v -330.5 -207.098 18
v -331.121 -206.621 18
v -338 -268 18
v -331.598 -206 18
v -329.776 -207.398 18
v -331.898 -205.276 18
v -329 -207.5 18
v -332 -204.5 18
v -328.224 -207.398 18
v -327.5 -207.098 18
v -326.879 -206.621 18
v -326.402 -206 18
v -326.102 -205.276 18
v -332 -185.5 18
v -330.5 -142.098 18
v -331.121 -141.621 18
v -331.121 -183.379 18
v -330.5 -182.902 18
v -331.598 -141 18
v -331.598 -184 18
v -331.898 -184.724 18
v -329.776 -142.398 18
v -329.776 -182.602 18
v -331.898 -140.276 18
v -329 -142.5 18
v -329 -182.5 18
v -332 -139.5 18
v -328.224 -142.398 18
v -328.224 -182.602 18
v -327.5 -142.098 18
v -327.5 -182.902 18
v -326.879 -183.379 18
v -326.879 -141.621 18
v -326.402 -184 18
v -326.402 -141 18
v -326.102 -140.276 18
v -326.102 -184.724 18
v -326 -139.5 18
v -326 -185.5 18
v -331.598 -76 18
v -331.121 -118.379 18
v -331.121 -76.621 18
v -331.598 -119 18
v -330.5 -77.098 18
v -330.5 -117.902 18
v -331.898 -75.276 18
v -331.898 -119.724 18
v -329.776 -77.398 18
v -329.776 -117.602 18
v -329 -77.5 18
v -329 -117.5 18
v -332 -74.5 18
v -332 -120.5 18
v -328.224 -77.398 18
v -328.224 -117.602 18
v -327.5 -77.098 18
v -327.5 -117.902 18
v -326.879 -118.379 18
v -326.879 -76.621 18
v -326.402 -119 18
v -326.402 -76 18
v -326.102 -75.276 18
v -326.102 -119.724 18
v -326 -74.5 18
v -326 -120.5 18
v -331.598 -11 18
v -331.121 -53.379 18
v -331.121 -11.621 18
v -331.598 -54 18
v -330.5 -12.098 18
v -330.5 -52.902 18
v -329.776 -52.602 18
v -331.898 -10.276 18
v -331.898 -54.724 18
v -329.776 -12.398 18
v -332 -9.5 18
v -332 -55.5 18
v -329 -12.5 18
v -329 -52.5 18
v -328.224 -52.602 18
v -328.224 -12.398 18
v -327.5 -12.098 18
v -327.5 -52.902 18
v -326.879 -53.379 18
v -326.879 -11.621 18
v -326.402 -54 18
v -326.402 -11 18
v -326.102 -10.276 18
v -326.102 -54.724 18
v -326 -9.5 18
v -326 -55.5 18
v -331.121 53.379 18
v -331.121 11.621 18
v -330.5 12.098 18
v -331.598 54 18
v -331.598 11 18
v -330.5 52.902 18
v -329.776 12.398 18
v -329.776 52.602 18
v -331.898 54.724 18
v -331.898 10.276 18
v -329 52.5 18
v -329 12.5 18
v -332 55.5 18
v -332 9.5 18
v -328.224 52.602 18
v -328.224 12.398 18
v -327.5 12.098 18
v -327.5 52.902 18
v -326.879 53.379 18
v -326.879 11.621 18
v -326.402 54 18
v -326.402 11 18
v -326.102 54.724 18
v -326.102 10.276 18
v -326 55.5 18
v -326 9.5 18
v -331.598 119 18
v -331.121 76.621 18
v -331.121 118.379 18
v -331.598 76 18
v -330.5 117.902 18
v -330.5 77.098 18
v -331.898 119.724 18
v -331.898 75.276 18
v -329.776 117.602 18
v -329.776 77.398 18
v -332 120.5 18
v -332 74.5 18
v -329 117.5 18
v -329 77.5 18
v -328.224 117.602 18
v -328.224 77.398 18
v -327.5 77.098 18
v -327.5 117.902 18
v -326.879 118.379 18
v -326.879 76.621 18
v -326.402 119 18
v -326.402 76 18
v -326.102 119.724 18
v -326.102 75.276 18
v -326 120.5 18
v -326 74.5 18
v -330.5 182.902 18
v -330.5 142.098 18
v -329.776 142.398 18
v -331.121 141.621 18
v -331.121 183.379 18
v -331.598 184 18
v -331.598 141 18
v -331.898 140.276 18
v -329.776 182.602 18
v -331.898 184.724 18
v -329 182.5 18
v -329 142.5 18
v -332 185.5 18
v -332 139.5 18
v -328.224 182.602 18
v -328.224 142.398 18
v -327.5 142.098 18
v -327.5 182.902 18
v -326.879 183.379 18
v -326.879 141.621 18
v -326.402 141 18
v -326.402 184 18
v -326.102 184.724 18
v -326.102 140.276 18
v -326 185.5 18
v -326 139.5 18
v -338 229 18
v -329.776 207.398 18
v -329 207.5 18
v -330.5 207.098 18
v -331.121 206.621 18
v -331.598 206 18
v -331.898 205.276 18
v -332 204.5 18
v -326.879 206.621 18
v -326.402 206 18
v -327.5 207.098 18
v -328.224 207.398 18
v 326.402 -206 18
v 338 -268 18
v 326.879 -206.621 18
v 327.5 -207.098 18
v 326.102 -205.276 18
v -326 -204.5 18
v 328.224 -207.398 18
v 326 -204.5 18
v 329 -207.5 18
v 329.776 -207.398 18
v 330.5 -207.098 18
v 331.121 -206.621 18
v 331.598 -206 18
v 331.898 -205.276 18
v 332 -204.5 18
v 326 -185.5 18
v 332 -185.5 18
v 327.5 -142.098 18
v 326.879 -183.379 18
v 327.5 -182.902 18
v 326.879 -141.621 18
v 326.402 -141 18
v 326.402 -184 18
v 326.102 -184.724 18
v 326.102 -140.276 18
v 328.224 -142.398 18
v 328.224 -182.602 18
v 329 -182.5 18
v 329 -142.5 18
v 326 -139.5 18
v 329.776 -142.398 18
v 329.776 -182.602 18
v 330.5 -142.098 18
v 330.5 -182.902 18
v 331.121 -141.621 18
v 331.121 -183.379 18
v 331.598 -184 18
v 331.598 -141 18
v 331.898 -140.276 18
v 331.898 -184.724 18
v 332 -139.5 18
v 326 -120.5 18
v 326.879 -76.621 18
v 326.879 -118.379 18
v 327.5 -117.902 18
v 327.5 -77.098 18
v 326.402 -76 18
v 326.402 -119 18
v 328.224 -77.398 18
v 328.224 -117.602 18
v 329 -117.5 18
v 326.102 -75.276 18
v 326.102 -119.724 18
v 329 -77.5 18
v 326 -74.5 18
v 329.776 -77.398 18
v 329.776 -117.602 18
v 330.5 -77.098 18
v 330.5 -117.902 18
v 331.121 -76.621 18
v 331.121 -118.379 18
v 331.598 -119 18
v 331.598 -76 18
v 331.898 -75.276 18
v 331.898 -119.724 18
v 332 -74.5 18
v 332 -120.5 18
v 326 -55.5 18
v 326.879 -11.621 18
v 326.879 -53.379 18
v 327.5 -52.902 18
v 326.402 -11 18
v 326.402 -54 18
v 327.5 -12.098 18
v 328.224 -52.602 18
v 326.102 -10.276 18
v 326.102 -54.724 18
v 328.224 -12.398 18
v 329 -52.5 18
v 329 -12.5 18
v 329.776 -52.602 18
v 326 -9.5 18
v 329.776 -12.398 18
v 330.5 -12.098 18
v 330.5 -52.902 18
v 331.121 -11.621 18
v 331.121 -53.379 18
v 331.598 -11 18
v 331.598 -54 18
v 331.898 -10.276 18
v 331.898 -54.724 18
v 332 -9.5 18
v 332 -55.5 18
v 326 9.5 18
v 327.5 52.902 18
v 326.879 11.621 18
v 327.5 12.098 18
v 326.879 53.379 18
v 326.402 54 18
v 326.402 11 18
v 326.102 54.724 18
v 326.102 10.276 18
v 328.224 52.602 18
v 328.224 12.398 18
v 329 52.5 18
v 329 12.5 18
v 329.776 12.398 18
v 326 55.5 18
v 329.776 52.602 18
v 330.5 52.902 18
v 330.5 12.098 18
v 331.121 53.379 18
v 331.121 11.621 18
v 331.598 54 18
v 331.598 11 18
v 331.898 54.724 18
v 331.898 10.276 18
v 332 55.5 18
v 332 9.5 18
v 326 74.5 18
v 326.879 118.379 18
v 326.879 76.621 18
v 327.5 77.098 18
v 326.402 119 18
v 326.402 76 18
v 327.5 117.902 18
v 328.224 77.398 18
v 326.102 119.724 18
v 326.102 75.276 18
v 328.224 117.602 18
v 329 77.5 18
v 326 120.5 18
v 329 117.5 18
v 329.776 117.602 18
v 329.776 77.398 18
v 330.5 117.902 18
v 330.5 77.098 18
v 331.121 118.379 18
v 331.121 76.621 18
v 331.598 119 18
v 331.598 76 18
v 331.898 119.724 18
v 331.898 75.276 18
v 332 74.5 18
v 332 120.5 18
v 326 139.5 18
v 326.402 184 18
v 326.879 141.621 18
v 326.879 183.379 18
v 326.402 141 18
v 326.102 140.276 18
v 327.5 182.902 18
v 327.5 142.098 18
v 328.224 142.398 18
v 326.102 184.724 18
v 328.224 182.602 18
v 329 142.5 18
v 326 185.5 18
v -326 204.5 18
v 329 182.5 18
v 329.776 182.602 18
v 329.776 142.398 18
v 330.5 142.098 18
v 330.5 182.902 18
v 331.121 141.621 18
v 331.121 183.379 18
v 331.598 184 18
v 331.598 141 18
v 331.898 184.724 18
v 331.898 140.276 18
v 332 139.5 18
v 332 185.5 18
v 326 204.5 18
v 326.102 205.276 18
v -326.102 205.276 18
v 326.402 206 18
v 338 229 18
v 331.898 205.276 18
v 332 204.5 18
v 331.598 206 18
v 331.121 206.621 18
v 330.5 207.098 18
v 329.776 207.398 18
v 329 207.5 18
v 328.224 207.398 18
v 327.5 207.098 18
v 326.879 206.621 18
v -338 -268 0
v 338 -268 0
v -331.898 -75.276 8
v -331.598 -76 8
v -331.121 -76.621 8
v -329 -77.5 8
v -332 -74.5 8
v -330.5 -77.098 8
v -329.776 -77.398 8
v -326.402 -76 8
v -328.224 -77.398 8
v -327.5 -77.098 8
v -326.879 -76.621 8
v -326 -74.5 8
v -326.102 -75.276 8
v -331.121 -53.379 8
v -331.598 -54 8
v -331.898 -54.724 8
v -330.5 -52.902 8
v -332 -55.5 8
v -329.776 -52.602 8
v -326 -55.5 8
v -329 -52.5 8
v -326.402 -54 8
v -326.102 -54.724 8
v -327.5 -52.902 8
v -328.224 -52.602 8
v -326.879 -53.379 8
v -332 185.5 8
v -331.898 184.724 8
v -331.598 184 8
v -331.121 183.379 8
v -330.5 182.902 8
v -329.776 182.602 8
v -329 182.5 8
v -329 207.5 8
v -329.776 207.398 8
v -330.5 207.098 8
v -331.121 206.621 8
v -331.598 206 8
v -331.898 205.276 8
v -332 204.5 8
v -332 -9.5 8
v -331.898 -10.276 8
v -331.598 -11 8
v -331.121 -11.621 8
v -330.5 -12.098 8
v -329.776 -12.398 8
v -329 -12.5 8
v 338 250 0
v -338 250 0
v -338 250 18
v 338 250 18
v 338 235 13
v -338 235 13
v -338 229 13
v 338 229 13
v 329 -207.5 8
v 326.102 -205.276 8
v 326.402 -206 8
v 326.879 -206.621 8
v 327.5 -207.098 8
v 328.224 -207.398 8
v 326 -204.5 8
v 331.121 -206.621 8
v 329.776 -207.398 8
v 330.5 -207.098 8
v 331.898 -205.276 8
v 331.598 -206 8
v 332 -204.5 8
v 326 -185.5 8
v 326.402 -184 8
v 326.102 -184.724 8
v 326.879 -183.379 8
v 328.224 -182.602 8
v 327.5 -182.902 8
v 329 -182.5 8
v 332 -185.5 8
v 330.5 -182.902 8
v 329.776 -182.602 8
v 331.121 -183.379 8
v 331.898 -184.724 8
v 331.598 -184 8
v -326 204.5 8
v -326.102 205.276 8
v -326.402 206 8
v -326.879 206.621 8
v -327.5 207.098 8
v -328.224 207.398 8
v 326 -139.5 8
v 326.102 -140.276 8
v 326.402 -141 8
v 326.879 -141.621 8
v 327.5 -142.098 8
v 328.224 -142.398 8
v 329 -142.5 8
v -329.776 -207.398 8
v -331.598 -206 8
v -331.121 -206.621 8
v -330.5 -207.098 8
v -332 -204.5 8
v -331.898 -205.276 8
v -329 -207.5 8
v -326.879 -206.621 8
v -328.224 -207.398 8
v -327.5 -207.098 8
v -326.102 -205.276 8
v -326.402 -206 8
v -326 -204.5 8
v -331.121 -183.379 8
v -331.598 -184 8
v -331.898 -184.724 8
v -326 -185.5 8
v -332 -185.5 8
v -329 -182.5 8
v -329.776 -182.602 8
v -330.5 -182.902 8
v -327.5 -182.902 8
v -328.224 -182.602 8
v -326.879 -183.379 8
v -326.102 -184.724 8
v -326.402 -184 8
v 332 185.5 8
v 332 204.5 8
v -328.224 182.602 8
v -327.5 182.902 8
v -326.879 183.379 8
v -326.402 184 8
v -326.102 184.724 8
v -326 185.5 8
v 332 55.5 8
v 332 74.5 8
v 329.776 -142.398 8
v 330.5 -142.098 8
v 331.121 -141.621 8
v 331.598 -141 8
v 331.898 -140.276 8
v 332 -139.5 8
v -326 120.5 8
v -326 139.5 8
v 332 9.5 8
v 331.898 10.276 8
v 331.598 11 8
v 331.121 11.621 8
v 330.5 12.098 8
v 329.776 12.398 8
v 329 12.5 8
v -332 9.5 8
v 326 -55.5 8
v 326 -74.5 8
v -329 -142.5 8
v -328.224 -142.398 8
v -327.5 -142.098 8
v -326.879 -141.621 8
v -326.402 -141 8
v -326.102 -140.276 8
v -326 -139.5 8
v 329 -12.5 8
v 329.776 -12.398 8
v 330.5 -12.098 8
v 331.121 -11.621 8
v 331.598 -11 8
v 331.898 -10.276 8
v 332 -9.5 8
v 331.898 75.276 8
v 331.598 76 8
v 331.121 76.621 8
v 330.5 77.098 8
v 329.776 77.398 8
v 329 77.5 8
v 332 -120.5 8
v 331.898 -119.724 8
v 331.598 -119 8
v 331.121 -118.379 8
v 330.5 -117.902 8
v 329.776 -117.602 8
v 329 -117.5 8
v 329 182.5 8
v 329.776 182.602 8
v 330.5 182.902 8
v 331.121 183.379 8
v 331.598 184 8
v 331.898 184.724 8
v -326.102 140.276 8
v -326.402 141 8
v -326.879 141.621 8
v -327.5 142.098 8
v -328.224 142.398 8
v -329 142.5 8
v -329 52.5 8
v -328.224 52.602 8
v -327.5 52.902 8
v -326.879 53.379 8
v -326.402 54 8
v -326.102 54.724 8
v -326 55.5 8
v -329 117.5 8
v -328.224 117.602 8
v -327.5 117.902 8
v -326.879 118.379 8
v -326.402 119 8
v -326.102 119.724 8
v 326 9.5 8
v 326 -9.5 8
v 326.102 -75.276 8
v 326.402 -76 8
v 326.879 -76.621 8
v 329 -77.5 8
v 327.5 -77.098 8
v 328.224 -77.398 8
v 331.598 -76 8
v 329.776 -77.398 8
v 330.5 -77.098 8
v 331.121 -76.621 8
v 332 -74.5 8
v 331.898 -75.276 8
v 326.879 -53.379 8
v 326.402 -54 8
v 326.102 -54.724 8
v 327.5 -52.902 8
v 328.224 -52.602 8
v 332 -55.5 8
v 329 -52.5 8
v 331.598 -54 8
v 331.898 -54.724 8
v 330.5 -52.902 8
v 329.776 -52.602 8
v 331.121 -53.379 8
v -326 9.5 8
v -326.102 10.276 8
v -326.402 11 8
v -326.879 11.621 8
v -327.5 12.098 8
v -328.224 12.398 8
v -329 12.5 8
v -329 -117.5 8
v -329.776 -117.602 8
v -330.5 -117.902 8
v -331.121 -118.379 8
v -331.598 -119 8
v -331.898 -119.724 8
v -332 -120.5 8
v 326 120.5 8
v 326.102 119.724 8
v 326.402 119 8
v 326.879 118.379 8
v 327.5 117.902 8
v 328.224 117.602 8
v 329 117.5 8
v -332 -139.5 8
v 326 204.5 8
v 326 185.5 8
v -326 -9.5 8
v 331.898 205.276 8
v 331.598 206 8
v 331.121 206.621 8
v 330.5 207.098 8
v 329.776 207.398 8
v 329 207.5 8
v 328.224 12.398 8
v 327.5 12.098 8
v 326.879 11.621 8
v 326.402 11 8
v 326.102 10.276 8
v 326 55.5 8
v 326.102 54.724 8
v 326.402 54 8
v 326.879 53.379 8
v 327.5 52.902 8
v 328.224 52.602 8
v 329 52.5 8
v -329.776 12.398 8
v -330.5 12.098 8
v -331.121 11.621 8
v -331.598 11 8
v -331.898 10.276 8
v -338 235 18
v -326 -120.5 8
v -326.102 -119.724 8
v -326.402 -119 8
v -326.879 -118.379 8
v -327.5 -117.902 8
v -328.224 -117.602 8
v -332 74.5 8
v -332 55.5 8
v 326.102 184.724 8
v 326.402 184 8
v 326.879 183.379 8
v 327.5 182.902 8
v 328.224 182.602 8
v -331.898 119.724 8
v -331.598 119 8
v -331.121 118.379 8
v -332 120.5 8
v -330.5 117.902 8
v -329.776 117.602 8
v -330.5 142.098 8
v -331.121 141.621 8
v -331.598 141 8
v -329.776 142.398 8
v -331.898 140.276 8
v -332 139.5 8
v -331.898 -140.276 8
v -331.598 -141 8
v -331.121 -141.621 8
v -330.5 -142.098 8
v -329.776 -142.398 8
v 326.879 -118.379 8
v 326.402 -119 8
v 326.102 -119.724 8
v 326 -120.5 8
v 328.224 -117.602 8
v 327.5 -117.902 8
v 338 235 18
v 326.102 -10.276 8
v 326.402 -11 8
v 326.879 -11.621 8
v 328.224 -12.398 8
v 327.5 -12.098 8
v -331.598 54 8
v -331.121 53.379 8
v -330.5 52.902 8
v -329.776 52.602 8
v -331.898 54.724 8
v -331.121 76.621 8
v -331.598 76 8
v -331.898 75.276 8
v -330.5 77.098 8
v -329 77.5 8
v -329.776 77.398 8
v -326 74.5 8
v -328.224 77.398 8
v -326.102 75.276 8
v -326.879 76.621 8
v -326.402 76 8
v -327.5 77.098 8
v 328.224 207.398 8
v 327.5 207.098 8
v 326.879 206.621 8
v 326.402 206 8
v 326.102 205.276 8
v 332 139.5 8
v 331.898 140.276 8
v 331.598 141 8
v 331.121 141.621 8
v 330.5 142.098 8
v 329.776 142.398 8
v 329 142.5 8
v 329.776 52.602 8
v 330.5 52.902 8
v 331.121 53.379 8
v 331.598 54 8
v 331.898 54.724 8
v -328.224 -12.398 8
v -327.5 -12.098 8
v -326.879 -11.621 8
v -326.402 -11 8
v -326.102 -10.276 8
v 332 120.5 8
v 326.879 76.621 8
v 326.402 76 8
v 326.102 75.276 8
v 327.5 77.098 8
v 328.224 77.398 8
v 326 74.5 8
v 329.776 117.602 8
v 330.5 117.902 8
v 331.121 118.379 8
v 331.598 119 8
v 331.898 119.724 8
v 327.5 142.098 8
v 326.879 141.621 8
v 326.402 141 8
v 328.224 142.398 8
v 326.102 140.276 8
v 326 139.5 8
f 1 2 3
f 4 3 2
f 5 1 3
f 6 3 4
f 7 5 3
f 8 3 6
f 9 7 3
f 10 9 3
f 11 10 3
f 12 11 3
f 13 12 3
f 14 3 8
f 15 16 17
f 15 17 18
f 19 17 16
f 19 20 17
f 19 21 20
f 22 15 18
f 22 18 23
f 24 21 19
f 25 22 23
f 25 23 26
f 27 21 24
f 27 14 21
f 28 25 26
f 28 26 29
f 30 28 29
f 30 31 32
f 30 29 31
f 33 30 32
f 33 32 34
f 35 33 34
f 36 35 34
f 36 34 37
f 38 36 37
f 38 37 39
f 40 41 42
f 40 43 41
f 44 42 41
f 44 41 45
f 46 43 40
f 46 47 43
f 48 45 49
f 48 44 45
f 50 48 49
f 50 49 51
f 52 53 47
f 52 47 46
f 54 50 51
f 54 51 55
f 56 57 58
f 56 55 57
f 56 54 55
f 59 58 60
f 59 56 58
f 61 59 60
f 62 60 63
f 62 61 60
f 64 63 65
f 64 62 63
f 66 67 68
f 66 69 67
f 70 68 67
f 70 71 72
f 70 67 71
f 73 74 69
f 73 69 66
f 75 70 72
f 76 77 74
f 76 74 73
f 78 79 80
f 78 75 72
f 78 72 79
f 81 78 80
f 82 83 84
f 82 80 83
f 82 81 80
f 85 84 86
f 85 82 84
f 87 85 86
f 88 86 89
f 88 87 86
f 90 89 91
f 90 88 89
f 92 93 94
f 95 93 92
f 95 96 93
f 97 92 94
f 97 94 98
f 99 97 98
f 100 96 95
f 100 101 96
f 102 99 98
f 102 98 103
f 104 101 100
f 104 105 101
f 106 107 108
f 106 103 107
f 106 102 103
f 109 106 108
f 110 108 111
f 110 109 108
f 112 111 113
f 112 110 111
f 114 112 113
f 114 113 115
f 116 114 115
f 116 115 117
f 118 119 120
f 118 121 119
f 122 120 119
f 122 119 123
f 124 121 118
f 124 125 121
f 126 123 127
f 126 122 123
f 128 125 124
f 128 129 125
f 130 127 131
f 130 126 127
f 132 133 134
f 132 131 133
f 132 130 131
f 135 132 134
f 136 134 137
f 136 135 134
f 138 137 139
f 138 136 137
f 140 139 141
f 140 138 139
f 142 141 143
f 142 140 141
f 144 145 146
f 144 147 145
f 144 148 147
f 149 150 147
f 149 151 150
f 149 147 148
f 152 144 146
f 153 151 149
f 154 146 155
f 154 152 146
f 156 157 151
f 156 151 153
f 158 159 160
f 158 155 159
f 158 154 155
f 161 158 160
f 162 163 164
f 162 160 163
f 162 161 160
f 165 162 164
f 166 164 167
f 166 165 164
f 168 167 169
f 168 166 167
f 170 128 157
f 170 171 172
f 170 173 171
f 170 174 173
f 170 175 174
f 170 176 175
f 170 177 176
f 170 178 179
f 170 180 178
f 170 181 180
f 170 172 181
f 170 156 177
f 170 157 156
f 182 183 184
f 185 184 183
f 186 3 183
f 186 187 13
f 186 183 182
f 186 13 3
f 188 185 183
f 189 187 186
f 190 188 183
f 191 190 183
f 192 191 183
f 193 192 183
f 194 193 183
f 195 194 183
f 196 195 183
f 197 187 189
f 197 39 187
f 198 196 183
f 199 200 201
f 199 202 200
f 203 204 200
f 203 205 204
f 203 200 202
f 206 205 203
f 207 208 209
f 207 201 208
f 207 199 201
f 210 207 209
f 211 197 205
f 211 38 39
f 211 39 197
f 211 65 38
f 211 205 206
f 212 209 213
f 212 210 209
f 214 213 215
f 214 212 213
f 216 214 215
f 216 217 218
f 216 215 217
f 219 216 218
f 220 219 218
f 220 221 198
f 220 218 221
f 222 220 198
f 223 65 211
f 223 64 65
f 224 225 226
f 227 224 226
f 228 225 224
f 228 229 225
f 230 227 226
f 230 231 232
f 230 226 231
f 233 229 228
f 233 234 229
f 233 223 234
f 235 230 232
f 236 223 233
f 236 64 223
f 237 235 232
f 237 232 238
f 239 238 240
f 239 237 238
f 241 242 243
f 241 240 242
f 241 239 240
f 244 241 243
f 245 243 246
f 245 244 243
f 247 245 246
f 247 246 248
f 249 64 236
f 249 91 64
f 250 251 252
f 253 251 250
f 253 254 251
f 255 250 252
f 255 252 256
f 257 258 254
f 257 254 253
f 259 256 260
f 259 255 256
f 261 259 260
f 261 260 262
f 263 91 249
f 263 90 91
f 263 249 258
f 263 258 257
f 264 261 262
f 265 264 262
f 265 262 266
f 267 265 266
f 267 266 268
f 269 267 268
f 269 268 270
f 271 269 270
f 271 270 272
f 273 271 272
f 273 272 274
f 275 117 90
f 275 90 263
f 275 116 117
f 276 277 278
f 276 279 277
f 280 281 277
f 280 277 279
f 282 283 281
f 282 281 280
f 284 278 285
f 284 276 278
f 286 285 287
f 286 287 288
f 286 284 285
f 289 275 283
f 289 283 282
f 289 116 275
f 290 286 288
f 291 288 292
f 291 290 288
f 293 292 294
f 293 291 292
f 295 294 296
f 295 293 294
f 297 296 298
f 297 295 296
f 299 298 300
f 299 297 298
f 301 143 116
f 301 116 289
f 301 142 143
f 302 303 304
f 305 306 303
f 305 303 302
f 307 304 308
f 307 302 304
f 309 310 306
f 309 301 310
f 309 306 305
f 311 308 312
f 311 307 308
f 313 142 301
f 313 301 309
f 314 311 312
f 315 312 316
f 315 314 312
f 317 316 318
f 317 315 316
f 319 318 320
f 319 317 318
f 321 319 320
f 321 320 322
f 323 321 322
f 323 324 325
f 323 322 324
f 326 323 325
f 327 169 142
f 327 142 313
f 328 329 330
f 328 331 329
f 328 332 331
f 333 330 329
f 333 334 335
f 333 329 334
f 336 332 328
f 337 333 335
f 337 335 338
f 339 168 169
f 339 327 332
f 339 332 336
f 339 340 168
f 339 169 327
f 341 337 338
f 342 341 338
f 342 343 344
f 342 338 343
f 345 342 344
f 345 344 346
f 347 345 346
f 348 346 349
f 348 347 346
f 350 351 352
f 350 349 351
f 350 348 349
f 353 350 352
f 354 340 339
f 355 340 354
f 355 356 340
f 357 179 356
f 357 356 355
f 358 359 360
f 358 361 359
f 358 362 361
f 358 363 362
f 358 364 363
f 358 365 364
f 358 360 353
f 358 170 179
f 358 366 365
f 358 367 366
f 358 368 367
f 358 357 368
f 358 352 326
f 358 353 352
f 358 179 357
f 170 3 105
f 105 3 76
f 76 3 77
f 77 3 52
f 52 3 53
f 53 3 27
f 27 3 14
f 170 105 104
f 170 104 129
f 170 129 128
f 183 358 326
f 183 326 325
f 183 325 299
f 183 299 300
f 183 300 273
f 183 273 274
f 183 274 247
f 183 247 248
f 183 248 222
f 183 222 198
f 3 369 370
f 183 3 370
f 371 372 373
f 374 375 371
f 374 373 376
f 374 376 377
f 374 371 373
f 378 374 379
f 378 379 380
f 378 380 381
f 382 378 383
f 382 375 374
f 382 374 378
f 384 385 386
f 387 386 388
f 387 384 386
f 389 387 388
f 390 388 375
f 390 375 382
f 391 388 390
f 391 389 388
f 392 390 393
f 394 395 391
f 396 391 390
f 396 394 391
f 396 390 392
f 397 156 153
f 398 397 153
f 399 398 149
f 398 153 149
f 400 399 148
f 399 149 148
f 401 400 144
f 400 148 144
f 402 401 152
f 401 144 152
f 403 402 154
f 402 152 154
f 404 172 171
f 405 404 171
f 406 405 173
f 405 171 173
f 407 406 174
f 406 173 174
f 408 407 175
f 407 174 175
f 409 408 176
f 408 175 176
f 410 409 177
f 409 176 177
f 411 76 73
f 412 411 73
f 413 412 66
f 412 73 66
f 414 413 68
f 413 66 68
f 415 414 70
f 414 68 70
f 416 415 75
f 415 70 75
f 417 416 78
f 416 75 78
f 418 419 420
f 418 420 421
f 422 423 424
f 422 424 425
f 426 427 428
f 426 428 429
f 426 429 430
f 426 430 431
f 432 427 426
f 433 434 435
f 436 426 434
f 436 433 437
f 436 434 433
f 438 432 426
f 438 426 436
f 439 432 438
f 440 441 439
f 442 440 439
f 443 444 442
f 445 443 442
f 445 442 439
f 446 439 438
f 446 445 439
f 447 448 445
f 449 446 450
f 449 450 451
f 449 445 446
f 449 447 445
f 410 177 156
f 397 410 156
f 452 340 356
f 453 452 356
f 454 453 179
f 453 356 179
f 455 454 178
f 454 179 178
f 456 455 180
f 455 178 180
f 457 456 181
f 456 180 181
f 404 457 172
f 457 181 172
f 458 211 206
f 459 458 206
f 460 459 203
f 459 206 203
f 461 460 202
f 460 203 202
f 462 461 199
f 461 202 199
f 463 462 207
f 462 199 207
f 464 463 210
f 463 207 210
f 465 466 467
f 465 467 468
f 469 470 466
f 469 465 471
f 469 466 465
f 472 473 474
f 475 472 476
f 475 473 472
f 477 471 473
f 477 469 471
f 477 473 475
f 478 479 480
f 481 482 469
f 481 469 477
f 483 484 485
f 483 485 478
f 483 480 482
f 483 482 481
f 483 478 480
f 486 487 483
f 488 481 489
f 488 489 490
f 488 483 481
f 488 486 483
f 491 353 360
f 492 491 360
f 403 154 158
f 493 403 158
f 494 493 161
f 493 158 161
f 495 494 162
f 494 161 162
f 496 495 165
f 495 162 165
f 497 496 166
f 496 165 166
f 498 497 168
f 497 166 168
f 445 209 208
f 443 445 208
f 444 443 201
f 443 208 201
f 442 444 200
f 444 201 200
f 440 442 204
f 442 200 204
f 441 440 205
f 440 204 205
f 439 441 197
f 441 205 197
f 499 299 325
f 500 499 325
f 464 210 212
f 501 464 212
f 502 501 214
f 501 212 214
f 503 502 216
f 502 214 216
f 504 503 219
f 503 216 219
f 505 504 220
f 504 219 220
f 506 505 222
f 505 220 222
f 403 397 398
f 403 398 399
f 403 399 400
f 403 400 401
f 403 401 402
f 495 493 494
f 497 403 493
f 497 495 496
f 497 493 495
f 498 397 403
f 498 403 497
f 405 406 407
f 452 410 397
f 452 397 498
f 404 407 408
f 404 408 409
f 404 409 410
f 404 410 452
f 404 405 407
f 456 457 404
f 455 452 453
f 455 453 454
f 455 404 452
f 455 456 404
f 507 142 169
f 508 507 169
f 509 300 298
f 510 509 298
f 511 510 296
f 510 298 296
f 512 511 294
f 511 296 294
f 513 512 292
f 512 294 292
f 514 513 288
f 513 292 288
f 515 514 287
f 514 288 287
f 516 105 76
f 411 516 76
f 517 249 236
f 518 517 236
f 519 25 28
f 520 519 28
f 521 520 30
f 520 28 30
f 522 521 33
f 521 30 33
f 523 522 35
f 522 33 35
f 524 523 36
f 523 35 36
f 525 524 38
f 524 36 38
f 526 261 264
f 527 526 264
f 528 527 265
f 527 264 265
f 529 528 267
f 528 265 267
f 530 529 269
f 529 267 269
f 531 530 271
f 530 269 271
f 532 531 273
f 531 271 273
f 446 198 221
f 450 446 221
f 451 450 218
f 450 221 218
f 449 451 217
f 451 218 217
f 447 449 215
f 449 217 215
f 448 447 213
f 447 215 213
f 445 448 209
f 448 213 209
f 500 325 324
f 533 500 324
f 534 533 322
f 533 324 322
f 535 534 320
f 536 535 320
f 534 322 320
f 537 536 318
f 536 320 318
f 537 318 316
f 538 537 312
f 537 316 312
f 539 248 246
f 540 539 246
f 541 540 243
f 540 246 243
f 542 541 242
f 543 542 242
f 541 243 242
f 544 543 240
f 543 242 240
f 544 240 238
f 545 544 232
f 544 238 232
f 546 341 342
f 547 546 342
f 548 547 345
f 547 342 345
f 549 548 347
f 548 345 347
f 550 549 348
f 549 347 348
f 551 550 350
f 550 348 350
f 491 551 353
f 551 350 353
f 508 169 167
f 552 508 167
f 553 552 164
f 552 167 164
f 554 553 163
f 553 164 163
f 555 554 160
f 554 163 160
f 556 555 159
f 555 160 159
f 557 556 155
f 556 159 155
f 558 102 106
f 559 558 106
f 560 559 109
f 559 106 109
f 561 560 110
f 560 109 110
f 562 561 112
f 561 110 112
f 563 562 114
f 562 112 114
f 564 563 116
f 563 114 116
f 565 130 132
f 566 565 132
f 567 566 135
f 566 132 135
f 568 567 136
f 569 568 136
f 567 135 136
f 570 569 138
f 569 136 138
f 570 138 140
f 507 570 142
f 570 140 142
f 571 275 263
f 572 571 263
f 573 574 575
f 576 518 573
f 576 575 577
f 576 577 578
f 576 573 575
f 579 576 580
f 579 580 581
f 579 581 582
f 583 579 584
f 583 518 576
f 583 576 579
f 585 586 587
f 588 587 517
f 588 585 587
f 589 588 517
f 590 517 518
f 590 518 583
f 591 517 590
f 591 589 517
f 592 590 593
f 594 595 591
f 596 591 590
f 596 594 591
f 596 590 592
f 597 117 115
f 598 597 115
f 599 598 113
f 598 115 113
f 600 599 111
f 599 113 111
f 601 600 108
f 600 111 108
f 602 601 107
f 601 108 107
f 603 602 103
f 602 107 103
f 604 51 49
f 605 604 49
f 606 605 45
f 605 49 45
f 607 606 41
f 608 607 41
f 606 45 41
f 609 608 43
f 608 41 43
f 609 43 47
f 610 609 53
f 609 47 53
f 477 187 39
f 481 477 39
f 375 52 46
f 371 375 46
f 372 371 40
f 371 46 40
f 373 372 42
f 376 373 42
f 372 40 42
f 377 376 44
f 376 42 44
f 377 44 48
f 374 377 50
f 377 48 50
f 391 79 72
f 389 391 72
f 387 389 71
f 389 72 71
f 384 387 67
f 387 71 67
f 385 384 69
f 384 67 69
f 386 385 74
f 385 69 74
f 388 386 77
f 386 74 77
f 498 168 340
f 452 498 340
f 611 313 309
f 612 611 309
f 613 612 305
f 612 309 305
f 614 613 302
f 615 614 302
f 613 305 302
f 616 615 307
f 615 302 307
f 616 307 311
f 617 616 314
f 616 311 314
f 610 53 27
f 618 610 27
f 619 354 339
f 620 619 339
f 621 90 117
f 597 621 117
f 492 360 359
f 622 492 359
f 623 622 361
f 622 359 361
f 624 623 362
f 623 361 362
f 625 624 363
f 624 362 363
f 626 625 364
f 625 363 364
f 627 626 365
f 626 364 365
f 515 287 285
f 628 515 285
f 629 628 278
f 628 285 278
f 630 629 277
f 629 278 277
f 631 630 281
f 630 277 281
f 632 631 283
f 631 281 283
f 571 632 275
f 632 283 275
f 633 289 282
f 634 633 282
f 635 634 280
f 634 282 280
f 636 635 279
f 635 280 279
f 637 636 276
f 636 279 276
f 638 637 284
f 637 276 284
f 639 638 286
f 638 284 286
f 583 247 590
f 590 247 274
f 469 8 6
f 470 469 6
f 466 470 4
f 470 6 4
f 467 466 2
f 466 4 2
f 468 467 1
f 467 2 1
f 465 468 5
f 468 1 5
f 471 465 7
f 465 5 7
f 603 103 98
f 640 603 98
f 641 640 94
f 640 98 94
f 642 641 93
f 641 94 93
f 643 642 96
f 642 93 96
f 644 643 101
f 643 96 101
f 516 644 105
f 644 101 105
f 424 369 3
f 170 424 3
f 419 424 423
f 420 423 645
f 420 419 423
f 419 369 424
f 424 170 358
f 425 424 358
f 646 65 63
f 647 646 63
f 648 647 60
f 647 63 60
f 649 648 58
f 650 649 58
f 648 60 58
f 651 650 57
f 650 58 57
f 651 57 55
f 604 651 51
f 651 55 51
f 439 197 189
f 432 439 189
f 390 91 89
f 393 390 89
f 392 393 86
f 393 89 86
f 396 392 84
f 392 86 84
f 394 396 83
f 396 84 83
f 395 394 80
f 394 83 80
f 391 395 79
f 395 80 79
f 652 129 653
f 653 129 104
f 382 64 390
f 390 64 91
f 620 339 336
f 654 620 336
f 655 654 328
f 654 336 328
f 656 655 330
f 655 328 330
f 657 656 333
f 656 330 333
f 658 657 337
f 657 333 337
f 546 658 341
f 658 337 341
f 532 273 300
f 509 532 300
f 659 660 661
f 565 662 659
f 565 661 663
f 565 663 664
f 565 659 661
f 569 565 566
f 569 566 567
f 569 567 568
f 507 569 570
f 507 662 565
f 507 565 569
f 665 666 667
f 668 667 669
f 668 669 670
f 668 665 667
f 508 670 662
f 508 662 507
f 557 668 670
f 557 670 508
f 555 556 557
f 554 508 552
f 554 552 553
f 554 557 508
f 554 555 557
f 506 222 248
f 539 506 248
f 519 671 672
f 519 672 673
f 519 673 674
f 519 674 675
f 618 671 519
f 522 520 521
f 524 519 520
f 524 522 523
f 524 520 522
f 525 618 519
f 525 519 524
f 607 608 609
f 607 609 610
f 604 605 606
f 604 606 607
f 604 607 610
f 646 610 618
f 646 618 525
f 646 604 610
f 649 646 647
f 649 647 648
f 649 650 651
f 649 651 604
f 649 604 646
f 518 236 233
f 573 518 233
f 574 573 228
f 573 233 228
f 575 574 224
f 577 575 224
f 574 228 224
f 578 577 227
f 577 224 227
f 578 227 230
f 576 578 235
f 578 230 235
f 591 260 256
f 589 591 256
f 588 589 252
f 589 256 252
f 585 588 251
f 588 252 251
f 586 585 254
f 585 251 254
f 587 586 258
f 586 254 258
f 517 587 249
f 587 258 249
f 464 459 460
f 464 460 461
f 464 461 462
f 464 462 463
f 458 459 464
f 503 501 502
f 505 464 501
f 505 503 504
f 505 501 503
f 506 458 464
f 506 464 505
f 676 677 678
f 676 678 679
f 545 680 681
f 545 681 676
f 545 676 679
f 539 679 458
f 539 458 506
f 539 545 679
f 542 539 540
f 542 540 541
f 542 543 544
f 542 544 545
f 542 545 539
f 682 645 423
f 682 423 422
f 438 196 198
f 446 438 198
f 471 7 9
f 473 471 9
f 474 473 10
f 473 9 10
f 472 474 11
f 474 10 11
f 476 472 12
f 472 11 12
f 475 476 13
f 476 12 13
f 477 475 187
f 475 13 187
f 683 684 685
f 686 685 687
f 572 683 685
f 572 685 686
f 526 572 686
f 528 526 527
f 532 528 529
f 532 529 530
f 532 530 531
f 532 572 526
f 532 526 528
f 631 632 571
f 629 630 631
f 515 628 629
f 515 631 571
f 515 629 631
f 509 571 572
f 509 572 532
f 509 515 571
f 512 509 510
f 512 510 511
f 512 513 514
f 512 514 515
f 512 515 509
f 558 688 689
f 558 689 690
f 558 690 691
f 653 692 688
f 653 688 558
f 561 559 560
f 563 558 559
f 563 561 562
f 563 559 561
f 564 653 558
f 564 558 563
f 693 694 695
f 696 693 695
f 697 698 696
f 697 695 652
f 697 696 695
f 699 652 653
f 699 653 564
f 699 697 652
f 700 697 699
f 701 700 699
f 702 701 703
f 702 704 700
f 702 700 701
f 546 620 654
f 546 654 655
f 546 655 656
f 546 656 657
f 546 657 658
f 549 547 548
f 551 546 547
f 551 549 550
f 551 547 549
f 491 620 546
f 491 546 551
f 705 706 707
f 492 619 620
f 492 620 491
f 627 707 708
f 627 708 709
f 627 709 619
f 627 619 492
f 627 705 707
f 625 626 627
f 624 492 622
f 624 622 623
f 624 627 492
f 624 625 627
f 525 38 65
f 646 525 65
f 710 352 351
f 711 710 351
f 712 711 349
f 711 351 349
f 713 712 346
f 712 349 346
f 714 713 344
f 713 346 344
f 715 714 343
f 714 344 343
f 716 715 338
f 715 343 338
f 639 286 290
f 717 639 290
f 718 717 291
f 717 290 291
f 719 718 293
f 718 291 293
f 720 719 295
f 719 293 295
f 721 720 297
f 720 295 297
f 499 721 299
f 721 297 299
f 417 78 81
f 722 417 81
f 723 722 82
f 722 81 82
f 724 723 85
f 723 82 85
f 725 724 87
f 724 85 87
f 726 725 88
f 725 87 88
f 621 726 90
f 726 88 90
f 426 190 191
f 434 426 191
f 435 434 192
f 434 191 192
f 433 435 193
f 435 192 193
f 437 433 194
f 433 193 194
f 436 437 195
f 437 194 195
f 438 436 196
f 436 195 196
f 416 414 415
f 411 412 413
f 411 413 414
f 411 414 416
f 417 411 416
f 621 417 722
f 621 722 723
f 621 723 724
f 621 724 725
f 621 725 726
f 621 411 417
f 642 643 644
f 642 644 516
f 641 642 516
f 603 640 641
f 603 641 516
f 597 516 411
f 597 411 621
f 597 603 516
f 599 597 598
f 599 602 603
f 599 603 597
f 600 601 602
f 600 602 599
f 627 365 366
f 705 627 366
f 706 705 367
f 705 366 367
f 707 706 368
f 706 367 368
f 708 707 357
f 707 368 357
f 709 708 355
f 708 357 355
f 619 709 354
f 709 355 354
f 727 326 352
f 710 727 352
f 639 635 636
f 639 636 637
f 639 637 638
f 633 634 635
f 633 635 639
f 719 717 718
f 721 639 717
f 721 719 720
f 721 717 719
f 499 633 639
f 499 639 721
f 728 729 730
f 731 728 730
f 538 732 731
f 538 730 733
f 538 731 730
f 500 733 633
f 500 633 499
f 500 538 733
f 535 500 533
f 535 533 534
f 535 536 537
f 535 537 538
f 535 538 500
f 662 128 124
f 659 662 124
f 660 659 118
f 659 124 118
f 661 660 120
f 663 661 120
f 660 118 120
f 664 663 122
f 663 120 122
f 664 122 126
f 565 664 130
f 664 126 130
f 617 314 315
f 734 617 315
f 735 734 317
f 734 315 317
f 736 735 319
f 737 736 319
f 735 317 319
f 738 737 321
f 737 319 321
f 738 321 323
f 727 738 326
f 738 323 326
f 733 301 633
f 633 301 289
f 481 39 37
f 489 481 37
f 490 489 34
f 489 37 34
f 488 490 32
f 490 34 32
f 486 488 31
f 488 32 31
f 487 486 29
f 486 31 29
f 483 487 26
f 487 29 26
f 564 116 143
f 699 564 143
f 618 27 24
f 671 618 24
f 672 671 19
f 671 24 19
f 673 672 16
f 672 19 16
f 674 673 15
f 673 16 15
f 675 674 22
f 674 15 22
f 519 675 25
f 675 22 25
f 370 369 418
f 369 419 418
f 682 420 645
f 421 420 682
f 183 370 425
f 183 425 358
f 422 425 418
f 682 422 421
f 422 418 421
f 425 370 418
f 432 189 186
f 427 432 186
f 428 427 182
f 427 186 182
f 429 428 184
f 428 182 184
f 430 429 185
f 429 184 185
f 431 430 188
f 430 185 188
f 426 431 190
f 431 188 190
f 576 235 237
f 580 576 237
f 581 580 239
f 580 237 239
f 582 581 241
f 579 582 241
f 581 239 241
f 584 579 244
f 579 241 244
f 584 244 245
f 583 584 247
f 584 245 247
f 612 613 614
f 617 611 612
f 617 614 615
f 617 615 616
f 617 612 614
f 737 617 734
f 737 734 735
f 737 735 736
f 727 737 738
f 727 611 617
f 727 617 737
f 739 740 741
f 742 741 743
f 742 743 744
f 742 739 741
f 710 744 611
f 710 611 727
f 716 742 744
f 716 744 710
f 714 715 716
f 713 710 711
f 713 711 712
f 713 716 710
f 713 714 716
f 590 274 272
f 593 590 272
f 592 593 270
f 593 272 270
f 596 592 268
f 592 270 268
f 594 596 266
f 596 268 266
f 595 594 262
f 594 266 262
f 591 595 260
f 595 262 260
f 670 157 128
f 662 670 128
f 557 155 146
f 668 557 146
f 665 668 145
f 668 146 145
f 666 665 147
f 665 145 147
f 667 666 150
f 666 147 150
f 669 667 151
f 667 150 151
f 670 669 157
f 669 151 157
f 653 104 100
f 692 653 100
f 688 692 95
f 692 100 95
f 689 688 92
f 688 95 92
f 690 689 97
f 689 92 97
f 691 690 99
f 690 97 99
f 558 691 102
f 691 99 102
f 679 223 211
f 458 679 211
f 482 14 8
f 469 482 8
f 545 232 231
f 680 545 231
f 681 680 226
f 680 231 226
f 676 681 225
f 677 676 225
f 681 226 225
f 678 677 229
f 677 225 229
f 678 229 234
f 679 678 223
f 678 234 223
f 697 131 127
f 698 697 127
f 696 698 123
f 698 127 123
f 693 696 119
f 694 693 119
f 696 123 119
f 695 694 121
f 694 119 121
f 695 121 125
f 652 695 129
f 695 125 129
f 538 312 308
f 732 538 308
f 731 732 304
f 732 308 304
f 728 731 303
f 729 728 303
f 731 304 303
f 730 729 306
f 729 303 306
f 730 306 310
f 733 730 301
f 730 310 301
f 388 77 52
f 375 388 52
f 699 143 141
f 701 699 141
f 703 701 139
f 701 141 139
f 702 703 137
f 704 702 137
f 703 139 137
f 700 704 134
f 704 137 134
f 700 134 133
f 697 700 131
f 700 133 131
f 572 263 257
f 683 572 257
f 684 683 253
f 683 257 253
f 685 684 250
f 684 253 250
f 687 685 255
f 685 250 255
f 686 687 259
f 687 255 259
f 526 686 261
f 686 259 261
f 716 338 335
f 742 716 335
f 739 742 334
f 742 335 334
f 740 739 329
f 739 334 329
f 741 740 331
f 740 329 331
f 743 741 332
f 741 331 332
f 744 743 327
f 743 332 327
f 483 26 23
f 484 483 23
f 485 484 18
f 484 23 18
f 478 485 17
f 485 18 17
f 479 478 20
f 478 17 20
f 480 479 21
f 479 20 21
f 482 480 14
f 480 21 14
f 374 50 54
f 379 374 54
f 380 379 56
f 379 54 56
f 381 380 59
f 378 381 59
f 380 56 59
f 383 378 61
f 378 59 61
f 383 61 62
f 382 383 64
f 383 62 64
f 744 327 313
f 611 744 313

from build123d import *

# Parameters (mm, degrees)
F0_W     = 676
F0_H     = 500
F1_DEPTH = 18
F2_W     = 676
F2_H     = 6
F3_DEPTH = 5
F5_DEPTH = 10
F6_DEPTH = 18


with BuildPart() as f1:
    # F0 (on Top) → F1 (new body)
    with BuildSketch(Plane.XY):
        Rectangle(F0_W, F0_H)
    extrude(amount=F1_DEPTH)

    # F2 (on face) → F3 (cut)
    with BuildSketch(Plane.XY.offset(18)):
        with Locations((0, 232)):
            Rectangle(F2_W, F2_H)
    extrude(amount=-F3_DEPTH, mode=Mode.SUBTRACT)

    # F4 (on face) → F5 (cut)
    with BuildSketch(Plane.XY.offset(18)):
        with BuildLine():
            Line((326, -185.5), (326, -204.5))
            ThreePointArc((326, -204.5), (326.8786796564, -206.6213203436), (329, -207.5))
            ThreePointArc((329, -207.5), (331.1213203436, -206.6213203436), (332, -204.5))
            Line((332, -204.5), (332, -185.5))
            ThreePointArc((332, -185.5), (331.1213203436, -183.3786796564), (329, -182.5))
            ThreePointArc((329, -182.5), (326.8786796564, -183.3786796564), (326, -185.5))
        make_face()
        with BuildLine():
            ThreePointArc((332, -120.5), (331.1213203436, -118.3786796564), (329, -117.5))
            ThreePointArc((329, -117.5), (326.8786796564, -118.3786796564), (326, -120.5))
            Line((326, -120.5), (326, -139.5))
            ThreePointArc((326, -139.5), (326.8786796564, -141.6213203436), (329, -142.5))
            ThreePointArc((329, -142.5), (331.1213203436, -141.6213203436), (332, -139.5))
            Line((332, -139.5), (332, -120.5))
        make_face()
        with BuildLine():
            ThreePointArc((326, -74.5), (326.8786796564, -76.6213203436), (329, -77.5))
            ThreePointArc((329, -77.5), (331.1213203436, -76.6213203436), (332, -74.5))
            Line((332, -74.5), (332, -55.5))
            ThreePointArc((332, -55.5), (331.1213203436, -53.3786796564), (329, -52.5))
            ThreePointArc((329, -52.5), (326.8786796564, -53.3786796564), (326, -55.5))
            Line((326, -55.5), (326, -74.5))
        make_face()
        with BuildLine():
            Line((332, -9.5), (332, 9.5))
            ThreePointArc((332, 9.5), (331.1213203436, 11.6213203436), (329, 12.5))
            ThreePointArc((329, 12.5), (326.8786796564, 11.6213203436), (326, 9.5))
            Line((326, 9.5), (326, -9.5))
            ThreePointArc((326, -9.5), (326.8786796564, -11.6213203436), (329, -12.5))
            ThreePointArc((329, -12.5), (331.1213203436, -11.6213203436), (332, -9.5))
        make_face()
        with BuildLine():
            ThreePointArc((329, 77.5), (326.8786796564, 76.6213203436), (326, 74.5))
            Line((326, 74.5), (326, 55.5))
            ThreePointArc((326, 55.5), (326.8786796564, 53.3786796564), (329, 52.5))
            ThreePointArc((329, 52.5), (331.1213203436, 53.3786796564), (332, 55.5))
            Line((332, 55.5), (332, 74.5))
            ThreePointArc((332, 74.5), (331.1213203436, 76.6213203436), (329, 77.5))
        make_face()
        with BuildLine():
            ThreePointArc((329, 142.5), (326.8786796564, 141.6213203436), (326, 139.5))
            Line((326, 139.5), (326, 120.5))
            ThreePointArc((326, 120.5), (326.8786796564, 118.3786796564), (329, 117.5))
            ThreePointArc((329, 117.5), (331.1213203436, 118.3786796564), (332, 120.5))
            Line((332, 120.5), (332, 139.5))
            ThreePointArc((332, 139.5), (331.1213203436, 141.6213203436), (329, 142.5))
        make_face()
        with BuildLine():
            ThreePointArc((329, 207.5), (326.8786796564, 206.6213203436), (326, 204.5))
            Line((326, 204.5), (326, 185.5))
            ThreePointArc((326, 185.5), (326.8786796564, 183.3786796564), (329, 182.5))
            ThreePointArc((329, 182.5), (331.1213203436, 183.3786796564), (332, 185.5))
            Line((332, 185.5), (332, 204.5))
            ThreePointArc((332, 204.5), (331.1213203436, 206.6213203436), (329, 207.5))
        make_face()
        with BuildLine():
            ThreePointArc((-329, -207.5), (-326.8786796564, -206.6213203436), (-326, -204.5))
            Line((-326, -204.5), (-326, -185.5))
            ThreePointArc((-326, -185.5), (-326.8786796564, -183.3786796564), (-329, -182.5))
            ThreePointArc((-329, -182.5), (-331.1213203436, -183.3786796564), (-332, -185.5))
            Line((-332, -185.5), (-332, -204.5))
            ThreePointArc((-332, -204.5), (-331.1213203436, -206.6213203436), (-329, -207.5))
        make_face()
        with BuildLine():
            ThreePointArc((-326, -120.5), (-326.8786796564, -118.3786796564), (-329, -117.5))
            ThreePointArc((-329, -117.5), (-331.1213203436, -118.3786796564), (-332, -120.5))
            Line((-332, -120.5), (-332, -139.5))
            ThreePointArc((-332, -139.5), (-331.1213203436, -141.6213203436), (-329, -142.5))
            ThreePointArc((-329, -142.5), (-326.8786796564, -141.6213203436), (-326, -139.5))
            Line((-326, -139.5), (-326, -120.5))
        make_face()
        with BuildLine():
            Line((-326, -74.5), (-326, -55.5))
            ThreePointArc((-326, -55.5), (-326.8786796564, -53.3786796564), (-329, -52.5))
            ThreePointArc((-329, -52.5), (-331.1213203436, -53.3786796564), (-332, -55.5))
            Line((-332, -55.5), (-332, -74.5))
            ThreePointArc((-332, -74.5), (-331.1213203436, -76.6213203436), (-329, -77.5))
            ThreePointArc((-329, -77.5), (-326.8786796564, -76.6213203436), (-326, -74.5))
        make_face()
        with BuildLine():
            ThreePointArc((-332, -9.5), (-331.1213203436, -11.6213203436), (-329, -12.5))
            ThreePointArc((-329, -12.5), (-326.8786796564, -11.6213203436), (-326, -9.5))
            Line((-326, -9.5), (-326, 9.5))
            ThreePointArc((-326, 9.5), (-326.8786796564, 11.6213203436), (-329, 12.5))
            ThreePointArc((-329, 12.5), (-331.1213203436, 11.6213203436), (-332, 9.5))
            Line((-332, 9.5), (-332, -9.5))
        make_face()
        with BuildLine():
            ThreePointArc((-326, 74.5), (-326.8786796564, 76.6213203436), (-329, 77.5))
            ThreePointArc((-329, 77.5), (-331.1213203436, 76.6213203436), (-332, 74.5))
            Line((-332, 74.5), (-332, 55.5))
            ThreePointArc((-332, 55.5), (-331.1213203436, 53.3786796564), (-329, 52.5))
            ThreePointArc((-329, 52.5), (-326.8786796564, 53.3786796564), (-326, 55.5))
            Line((-326, 55.5), (-326, 74.5))
        make_face()
        with BuildLine():
            ThreePointArc((-329, 142.5), (-331.1213203436, 141.6213203436), (-332, 139.5))
            Line((-332, 139.5), (-332, 120.5))
            ThreePointArc((-332, 120.5), (-331.1213203436, 118.3786796564), (-329, 117.5))
            ThreePointArc((-329, 117.5), (-326.8786796564, 118.3786796564), (-326, 120.5))
            Line((-326, 120.5), (-326, 139.5))
            ThreePointArc((-326, 139.5), (-326.8786796564, 141.6213203436), (-329, 142.5))
        make_face()
        with BuildLine():
            ThreePointArc((-329, 207.5), (-331.1213203436, 206.6213203436), (-332, 204.5))
            Line((-332, 204.5), (-332, 185.5))
            ThreePointArc((-332, 185.5), (-331.1213203436, 183.3786796564), (-329, 182.5))
            ThreePointArc((-329, 182.5), (-326.8786796564, 183.3786796564), (-326, 185.5))
            Line((-326, 185.5), (-326, 204.5))
            ThreePointArc((-326, 204.5), (-326.8786796564, 206.6213203436), (-329, 207.5))
        make_face()
    extrude(amount=-F5_DEPTH, mode=Mode.SUBTRACT)

    # F6 (add): a face of the model
    f6_faces = [f1.faces().sort_by_distance(p)[0] for p in [
        (0, -250, 9),
    ]]
    extrude(f6_faces, amount=F6_DEPTH)


solid = f1.part
